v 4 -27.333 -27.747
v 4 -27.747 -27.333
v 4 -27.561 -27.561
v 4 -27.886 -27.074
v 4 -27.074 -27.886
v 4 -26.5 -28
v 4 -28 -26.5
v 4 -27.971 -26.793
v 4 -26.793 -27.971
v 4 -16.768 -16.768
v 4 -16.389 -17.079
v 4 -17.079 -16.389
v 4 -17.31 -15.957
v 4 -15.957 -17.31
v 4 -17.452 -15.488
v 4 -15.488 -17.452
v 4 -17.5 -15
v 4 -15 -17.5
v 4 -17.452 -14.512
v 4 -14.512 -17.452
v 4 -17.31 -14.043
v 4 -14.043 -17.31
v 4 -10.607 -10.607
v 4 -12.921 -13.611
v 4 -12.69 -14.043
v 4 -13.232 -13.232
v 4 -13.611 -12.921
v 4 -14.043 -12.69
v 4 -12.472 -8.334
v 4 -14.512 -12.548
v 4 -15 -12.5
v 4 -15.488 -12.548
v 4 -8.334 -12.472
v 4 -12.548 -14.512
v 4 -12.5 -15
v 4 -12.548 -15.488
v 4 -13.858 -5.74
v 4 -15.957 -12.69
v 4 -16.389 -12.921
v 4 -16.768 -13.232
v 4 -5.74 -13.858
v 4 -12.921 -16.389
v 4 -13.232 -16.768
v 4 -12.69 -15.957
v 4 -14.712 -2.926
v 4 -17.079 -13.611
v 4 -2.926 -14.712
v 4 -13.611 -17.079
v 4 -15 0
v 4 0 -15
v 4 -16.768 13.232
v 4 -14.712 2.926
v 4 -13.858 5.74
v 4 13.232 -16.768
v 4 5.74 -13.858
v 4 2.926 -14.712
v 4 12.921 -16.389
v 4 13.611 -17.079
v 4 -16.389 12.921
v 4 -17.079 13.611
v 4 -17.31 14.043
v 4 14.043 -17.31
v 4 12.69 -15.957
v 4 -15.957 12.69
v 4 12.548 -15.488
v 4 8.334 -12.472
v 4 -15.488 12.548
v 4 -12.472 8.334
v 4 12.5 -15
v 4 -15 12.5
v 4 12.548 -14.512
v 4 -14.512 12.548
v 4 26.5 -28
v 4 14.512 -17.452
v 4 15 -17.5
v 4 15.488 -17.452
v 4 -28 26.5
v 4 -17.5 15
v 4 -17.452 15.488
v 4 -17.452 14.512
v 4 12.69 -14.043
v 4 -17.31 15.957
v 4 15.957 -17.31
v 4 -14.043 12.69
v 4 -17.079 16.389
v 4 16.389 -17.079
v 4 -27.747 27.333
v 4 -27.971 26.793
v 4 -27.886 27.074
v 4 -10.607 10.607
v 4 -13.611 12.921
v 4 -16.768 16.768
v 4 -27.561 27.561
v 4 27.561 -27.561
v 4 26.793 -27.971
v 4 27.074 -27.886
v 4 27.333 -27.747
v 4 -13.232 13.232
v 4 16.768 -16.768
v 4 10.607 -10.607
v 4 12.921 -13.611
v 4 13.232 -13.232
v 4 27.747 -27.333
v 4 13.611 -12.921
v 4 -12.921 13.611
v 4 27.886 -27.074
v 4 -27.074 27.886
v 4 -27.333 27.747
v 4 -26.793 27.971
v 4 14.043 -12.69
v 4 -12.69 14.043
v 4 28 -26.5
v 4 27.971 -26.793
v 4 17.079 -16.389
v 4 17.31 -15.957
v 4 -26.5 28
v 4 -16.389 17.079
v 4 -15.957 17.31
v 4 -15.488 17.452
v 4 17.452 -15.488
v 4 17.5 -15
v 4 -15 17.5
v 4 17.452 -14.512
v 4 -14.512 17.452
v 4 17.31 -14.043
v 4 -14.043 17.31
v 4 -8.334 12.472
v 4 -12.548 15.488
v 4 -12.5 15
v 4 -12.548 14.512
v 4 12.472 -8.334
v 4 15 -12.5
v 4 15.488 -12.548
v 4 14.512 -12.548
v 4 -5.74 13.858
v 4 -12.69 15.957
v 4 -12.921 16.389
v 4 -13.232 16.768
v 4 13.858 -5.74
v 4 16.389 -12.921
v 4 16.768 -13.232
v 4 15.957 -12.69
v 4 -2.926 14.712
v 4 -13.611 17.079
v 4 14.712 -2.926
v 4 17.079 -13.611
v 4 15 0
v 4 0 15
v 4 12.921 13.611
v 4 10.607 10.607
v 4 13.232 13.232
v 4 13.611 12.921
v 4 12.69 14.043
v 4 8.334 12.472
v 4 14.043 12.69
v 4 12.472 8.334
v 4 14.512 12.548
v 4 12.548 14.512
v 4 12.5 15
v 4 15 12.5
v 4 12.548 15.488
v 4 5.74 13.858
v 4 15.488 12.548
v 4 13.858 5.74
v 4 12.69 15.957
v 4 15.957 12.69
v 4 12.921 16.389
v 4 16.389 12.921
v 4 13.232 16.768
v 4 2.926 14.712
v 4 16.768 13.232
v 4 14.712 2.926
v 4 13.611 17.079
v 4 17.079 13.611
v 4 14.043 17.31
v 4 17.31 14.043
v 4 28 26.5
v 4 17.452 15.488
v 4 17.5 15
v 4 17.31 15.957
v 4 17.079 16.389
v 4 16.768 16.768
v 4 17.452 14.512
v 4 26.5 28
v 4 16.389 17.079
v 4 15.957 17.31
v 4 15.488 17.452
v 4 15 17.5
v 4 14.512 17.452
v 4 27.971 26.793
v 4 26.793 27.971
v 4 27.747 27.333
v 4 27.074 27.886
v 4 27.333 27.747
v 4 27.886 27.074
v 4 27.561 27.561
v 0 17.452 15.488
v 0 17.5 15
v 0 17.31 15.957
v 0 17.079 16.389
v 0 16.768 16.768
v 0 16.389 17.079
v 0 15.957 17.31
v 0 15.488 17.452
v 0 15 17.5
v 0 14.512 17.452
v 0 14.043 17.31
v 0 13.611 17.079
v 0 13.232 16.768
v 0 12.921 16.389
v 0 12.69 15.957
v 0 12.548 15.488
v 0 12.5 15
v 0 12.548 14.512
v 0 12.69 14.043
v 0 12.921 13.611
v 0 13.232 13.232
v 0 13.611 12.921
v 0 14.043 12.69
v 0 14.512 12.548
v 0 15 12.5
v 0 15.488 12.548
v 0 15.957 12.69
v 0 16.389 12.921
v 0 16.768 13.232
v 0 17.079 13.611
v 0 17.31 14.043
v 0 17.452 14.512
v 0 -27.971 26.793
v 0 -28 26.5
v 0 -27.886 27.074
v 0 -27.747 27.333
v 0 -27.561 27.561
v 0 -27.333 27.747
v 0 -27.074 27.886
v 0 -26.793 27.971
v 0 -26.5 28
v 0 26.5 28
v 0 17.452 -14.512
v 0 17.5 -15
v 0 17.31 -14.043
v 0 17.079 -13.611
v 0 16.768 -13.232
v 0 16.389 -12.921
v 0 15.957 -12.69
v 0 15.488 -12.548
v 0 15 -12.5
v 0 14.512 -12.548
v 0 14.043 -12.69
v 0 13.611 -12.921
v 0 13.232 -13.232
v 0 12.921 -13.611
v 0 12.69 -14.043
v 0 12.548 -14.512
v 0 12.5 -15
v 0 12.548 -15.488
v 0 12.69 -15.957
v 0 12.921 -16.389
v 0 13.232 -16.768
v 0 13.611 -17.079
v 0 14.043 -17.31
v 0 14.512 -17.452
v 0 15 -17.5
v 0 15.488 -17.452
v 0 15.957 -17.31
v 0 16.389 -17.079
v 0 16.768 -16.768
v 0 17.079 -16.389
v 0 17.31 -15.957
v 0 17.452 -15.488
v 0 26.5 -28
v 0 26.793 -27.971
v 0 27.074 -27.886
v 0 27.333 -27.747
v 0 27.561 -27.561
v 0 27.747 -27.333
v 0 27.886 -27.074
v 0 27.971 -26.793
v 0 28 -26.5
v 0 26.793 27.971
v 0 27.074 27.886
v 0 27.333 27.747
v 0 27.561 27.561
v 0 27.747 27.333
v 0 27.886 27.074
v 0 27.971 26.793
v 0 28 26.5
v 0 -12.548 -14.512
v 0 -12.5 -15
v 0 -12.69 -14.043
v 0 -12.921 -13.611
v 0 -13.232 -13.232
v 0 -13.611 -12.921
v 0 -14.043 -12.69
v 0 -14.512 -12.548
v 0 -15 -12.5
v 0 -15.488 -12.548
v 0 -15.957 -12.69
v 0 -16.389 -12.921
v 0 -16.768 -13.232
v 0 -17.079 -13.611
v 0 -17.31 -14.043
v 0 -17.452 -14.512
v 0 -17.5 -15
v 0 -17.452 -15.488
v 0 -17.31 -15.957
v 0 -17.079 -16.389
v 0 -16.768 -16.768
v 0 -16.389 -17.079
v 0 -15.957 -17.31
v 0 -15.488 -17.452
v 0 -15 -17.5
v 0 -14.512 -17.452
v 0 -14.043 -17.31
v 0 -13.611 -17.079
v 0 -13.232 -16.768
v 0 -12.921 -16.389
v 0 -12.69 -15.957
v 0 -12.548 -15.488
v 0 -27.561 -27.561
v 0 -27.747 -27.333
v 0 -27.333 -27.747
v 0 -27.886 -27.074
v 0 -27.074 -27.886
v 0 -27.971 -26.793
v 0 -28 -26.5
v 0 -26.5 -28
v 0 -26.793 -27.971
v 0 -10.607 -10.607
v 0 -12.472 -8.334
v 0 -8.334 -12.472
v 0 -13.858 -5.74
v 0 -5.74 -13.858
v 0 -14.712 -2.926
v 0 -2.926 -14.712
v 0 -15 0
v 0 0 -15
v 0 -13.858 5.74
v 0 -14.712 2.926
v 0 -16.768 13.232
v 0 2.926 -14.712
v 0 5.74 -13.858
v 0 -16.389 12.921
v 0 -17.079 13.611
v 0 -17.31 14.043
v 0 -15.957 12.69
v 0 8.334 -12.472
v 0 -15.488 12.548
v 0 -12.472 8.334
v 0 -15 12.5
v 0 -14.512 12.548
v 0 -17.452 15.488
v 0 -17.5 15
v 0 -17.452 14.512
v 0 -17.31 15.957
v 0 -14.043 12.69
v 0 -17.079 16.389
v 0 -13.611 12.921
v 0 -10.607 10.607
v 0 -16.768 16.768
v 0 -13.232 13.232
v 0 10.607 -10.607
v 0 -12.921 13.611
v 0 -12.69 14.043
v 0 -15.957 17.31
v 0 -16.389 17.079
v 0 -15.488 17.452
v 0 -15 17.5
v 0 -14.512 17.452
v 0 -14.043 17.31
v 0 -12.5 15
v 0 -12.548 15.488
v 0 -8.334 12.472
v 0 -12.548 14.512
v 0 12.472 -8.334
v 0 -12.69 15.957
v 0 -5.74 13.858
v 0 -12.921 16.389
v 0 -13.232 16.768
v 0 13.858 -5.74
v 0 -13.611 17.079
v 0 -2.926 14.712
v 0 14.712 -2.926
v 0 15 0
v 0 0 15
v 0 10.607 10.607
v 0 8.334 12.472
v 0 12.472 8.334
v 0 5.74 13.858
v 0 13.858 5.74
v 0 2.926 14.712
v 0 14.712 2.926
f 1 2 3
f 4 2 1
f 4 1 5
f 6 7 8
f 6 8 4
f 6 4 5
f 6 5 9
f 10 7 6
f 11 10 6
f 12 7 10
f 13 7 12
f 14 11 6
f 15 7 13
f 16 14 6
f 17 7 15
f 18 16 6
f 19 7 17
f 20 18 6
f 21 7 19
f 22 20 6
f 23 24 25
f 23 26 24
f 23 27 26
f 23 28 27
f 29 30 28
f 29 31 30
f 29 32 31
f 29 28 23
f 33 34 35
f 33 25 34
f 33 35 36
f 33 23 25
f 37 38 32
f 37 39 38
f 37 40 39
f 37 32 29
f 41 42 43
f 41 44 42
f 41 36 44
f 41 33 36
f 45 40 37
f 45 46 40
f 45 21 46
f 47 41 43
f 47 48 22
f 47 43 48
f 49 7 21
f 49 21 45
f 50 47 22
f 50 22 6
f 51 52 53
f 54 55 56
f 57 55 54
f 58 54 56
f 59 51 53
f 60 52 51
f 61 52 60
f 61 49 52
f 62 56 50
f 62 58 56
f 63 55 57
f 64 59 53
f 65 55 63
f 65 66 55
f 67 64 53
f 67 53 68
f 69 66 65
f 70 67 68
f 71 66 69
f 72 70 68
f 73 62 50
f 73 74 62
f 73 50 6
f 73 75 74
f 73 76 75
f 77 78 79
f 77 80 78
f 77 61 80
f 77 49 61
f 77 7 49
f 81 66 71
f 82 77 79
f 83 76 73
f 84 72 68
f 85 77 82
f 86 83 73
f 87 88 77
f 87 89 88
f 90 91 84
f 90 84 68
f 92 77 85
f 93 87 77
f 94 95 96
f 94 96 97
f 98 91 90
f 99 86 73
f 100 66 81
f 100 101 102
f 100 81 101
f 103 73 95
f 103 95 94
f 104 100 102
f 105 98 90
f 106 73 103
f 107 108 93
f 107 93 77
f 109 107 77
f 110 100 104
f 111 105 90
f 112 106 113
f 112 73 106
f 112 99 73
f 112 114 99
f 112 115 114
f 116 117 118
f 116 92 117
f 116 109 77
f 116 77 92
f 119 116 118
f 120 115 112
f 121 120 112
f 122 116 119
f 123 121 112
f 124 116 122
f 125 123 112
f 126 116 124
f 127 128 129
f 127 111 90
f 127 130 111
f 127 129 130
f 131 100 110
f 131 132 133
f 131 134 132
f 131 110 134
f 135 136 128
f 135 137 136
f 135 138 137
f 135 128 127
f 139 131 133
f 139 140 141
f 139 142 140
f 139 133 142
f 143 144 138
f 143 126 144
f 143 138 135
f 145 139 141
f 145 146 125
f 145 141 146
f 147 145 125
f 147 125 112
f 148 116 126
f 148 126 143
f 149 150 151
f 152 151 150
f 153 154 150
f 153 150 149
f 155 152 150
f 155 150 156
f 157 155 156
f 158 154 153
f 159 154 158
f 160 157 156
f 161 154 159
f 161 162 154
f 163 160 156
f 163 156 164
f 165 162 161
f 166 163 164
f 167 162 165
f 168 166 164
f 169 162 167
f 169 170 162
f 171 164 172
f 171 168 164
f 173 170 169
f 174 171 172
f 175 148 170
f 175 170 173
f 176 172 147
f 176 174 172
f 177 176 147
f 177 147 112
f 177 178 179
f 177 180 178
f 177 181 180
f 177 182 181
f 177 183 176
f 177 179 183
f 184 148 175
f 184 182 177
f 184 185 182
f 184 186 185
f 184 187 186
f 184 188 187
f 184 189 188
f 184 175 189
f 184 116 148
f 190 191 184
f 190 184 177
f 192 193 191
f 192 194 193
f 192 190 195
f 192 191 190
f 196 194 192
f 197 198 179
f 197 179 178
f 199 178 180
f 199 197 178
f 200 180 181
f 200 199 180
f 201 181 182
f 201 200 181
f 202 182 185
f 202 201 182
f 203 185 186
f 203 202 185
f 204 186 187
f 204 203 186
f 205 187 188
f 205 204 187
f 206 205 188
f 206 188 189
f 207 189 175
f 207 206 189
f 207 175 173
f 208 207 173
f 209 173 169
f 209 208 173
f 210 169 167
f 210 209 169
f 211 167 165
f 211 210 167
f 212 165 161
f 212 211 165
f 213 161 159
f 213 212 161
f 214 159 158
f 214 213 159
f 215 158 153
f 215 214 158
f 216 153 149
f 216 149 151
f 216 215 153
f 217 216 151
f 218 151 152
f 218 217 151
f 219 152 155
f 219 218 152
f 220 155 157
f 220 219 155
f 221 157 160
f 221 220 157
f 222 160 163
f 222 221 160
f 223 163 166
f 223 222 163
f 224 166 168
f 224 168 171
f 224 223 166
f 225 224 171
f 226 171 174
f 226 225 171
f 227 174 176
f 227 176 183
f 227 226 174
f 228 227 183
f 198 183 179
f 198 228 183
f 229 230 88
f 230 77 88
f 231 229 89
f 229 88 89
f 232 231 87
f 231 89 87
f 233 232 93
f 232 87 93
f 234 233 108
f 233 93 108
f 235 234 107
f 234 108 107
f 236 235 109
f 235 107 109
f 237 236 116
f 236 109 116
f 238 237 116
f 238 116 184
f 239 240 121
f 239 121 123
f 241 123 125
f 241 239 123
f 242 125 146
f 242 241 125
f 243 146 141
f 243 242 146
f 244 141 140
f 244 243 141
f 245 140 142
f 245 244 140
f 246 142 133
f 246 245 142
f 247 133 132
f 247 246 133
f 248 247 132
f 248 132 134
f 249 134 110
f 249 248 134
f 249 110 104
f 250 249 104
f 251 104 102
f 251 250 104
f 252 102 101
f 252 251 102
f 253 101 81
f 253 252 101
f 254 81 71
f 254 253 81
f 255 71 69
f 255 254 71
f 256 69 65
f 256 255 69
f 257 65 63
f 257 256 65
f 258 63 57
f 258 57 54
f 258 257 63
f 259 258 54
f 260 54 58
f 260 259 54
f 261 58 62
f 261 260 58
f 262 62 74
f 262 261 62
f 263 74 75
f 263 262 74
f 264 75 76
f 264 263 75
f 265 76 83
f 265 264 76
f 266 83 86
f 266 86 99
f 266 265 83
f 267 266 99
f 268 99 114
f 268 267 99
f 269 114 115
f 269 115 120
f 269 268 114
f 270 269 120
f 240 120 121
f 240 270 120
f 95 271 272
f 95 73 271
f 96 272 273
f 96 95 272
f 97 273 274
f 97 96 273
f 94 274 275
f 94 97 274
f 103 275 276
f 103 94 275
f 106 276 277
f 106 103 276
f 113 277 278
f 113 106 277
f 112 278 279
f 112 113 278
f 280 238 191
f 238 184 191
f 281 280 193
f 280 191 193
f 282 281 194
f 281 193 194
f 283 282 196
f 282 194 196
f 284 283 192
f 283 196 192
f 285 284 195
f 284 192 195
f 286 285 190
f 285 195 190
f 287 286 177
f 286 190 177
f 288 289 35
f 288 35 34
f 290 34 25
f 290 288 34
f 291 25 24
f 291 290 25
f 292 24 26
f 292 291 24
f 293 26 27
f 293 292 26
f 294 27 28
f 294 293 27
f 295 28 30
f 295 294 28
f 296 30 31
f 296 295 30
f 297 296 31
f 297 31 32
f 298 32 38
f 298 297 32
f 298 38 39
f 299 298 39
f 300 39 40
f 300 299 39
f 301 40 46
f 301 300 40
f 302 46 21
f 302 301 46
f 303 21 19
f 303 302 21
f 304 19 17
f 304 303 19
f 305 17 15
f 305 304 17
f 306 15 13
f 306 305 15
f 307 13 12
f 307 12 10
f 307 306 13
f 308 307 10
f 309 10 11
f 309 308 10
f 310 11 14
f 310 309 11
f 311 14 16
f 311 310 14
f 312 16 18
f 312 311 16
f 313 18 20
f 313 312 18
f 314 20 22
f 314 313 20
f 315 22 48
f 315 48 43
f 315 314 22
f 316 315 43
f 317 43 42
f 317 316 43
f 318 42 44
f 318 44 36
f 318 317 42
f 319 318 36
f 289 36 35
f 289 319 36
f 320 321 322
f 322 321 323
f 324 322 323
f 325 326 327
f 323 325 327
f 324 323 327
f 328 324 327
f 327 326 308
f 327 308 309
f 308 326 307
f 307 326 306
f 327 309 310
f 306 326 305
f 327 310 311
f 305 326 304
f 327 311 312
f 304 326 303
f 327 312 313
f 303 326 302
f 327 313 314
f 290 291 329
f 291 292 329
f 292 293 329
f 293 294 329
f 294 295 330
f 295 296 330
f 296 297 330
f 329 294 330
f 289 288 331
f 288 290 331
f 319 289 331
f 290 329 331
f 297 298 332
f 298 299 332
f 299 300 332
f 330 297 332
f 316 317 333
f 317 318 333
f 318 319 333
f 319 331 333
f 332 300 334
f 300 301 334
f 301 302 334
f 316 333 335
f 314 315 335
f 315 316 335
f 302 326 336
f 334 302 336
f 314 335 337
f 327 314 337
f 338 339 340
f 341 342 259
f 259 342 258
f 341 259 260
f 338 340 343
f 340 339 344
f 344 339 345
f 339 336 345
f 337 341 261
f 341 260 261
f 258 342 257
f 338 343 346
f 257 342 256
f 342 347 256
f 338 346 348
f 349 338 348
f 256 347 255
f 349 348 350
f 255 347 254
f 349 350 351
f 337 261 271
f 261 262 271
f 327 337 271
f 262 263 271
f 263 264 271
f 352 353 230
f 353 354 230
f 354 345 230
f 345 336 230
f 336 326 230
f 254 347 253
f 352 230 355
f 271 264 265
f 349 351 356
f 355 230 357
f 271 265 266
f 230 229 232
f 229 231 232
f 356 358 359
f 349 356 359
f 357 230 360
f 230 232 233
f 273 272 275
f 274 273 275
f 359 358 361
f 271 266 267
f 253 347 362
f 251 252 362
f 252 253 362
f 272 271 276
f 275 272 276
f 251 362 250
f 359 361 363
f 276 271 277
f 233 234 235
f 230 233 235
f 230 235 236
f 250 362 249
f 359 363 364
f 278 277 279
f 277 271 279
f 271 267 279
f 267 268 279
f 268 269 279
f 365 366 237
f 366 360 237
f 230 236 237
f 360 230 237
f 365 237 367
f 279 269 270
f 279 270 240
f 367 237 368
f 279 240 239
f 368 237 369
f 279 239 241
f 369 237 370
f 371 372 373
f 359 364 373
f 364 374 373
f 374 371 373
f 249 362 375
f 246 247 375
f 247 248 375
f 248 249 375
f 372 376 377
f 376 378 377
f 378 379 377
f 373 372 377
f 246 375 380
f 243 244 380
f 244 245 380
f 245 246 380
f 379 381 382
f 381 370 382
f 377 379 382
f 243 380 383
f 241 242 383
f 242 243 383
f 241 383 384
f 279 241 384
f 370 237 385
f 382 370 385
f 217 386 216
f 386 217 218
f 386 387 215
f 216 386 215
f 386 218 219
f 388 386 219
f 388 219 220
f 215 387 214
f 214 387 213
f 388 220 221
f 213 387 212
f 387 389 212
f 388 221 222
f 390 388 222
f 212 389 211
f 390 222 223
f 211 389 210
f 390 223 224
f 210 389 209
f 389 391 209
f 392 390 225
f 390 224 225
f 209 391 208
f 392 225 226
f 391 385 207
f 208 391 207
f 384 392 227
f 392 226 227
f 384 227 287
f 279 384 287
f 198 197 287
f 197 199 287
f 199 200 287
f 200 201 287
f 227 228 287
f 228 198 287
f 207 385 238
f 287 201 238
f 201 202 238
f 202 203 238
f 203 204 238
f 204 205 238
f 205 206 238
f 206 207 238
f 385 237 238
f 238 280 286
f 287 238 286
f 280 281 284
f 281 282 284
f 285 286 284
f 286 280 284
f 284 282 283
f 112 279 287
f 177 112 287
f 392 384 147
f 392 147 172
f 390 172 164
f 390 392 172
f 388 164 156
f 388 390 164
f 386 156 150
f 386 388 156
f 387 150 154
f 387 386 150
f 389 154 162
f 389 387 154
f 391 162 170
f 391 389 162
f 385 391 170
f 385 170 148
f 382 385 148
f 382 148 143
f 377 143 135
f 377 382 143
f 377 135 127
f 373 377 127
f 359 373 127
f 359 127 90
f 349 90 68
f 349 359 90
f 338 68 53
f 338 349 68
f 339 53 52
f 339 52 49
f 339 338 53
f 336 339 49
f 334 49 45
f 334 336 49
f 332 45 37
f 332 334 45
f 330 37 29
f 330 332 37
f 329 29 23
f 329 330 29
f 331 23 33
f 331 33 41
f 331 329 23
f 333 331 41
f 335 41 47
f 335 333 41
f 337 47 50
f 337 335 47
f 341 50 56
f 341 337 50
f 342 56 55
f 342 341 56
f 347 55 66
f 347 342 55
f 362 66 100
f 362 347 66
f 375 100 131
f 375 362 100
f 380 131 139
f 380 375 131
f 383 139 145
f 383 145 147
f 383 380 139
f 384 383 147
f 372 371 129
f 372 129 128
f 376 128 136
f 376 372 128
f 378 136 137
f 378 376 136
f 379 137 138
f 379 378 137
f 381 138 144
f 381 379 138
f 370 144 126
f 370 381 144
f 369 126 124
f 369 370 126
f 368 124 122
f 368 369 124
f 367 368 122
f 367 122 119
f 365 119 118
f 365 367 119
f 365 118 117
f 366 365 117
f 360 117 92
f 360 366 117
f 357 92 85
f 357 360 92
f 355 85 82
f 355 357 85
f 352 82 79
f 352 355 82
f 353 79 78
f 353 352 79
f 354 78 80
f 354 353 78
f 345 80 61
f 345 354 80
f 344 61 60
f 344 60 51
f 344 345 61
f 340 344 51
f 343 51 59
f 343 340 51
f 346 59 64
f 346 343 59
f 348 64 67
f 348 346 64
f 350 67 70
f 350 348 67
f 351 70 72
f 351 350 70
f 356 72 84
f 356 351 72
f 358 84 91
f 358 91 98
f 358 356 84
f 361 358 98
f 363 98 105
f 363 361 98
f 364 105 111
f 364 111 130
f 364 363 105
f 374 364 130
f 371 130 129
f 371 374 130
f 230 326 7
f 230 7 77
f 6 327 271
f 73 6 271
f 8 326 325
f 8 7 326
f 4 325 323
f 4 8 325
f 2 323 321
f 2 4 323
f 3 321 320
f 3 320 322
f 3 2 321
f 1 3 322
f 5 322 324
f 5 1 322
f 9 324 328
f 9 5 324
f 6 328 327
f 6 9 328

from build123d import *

# Parameters (mm, degrees)
F0_W     = 56
F0_H     = 56
F0_R     = 2.5
F0_R_2   = 15
F1_DEPTH = 4
F2_R     = 1.5


# Not quite as in the source:
# - a feature names something its author has since deleted; it is built from what else it names


with BuildPart() as f1:
    # F0 (on Right) → F1 (new body)
    with BuildSketch(Plane.YZ):
        Rectangle(F0_W, F0_H)
        with Locations((-15, -15)):
            Circle(F0_R, mode=Mode.SUBTRACT)
        with Locations((15, -15)):
            Circle(F0_R, mode=Mode.SUBTRACT)
        with Locations((-15, 15)):
            Circle(F0_R, mode=Mode.SUBTRACT)
        Circle(F0_R_2, mode=Mode.SUBTRACT)
        with Locations((15, 15)):
            Circle(F0_R, mode=Mode.SUBTRACT)
    extrude(amount=F1_DEPTH)

    # F2
    f2_edges = [f1.edges().sort_by_distance(p)[0] for p in [
        (2, -28, 28),
        (2, -28, -28),
        (2, 28, -28),
        (2, 28, 28),
    ]]
    fillet(f2_edges, radius=F2_R)


with BuildPart() as f3_1:
    # F3: copy of F1
    add(f1.part)


solid = f1.part
